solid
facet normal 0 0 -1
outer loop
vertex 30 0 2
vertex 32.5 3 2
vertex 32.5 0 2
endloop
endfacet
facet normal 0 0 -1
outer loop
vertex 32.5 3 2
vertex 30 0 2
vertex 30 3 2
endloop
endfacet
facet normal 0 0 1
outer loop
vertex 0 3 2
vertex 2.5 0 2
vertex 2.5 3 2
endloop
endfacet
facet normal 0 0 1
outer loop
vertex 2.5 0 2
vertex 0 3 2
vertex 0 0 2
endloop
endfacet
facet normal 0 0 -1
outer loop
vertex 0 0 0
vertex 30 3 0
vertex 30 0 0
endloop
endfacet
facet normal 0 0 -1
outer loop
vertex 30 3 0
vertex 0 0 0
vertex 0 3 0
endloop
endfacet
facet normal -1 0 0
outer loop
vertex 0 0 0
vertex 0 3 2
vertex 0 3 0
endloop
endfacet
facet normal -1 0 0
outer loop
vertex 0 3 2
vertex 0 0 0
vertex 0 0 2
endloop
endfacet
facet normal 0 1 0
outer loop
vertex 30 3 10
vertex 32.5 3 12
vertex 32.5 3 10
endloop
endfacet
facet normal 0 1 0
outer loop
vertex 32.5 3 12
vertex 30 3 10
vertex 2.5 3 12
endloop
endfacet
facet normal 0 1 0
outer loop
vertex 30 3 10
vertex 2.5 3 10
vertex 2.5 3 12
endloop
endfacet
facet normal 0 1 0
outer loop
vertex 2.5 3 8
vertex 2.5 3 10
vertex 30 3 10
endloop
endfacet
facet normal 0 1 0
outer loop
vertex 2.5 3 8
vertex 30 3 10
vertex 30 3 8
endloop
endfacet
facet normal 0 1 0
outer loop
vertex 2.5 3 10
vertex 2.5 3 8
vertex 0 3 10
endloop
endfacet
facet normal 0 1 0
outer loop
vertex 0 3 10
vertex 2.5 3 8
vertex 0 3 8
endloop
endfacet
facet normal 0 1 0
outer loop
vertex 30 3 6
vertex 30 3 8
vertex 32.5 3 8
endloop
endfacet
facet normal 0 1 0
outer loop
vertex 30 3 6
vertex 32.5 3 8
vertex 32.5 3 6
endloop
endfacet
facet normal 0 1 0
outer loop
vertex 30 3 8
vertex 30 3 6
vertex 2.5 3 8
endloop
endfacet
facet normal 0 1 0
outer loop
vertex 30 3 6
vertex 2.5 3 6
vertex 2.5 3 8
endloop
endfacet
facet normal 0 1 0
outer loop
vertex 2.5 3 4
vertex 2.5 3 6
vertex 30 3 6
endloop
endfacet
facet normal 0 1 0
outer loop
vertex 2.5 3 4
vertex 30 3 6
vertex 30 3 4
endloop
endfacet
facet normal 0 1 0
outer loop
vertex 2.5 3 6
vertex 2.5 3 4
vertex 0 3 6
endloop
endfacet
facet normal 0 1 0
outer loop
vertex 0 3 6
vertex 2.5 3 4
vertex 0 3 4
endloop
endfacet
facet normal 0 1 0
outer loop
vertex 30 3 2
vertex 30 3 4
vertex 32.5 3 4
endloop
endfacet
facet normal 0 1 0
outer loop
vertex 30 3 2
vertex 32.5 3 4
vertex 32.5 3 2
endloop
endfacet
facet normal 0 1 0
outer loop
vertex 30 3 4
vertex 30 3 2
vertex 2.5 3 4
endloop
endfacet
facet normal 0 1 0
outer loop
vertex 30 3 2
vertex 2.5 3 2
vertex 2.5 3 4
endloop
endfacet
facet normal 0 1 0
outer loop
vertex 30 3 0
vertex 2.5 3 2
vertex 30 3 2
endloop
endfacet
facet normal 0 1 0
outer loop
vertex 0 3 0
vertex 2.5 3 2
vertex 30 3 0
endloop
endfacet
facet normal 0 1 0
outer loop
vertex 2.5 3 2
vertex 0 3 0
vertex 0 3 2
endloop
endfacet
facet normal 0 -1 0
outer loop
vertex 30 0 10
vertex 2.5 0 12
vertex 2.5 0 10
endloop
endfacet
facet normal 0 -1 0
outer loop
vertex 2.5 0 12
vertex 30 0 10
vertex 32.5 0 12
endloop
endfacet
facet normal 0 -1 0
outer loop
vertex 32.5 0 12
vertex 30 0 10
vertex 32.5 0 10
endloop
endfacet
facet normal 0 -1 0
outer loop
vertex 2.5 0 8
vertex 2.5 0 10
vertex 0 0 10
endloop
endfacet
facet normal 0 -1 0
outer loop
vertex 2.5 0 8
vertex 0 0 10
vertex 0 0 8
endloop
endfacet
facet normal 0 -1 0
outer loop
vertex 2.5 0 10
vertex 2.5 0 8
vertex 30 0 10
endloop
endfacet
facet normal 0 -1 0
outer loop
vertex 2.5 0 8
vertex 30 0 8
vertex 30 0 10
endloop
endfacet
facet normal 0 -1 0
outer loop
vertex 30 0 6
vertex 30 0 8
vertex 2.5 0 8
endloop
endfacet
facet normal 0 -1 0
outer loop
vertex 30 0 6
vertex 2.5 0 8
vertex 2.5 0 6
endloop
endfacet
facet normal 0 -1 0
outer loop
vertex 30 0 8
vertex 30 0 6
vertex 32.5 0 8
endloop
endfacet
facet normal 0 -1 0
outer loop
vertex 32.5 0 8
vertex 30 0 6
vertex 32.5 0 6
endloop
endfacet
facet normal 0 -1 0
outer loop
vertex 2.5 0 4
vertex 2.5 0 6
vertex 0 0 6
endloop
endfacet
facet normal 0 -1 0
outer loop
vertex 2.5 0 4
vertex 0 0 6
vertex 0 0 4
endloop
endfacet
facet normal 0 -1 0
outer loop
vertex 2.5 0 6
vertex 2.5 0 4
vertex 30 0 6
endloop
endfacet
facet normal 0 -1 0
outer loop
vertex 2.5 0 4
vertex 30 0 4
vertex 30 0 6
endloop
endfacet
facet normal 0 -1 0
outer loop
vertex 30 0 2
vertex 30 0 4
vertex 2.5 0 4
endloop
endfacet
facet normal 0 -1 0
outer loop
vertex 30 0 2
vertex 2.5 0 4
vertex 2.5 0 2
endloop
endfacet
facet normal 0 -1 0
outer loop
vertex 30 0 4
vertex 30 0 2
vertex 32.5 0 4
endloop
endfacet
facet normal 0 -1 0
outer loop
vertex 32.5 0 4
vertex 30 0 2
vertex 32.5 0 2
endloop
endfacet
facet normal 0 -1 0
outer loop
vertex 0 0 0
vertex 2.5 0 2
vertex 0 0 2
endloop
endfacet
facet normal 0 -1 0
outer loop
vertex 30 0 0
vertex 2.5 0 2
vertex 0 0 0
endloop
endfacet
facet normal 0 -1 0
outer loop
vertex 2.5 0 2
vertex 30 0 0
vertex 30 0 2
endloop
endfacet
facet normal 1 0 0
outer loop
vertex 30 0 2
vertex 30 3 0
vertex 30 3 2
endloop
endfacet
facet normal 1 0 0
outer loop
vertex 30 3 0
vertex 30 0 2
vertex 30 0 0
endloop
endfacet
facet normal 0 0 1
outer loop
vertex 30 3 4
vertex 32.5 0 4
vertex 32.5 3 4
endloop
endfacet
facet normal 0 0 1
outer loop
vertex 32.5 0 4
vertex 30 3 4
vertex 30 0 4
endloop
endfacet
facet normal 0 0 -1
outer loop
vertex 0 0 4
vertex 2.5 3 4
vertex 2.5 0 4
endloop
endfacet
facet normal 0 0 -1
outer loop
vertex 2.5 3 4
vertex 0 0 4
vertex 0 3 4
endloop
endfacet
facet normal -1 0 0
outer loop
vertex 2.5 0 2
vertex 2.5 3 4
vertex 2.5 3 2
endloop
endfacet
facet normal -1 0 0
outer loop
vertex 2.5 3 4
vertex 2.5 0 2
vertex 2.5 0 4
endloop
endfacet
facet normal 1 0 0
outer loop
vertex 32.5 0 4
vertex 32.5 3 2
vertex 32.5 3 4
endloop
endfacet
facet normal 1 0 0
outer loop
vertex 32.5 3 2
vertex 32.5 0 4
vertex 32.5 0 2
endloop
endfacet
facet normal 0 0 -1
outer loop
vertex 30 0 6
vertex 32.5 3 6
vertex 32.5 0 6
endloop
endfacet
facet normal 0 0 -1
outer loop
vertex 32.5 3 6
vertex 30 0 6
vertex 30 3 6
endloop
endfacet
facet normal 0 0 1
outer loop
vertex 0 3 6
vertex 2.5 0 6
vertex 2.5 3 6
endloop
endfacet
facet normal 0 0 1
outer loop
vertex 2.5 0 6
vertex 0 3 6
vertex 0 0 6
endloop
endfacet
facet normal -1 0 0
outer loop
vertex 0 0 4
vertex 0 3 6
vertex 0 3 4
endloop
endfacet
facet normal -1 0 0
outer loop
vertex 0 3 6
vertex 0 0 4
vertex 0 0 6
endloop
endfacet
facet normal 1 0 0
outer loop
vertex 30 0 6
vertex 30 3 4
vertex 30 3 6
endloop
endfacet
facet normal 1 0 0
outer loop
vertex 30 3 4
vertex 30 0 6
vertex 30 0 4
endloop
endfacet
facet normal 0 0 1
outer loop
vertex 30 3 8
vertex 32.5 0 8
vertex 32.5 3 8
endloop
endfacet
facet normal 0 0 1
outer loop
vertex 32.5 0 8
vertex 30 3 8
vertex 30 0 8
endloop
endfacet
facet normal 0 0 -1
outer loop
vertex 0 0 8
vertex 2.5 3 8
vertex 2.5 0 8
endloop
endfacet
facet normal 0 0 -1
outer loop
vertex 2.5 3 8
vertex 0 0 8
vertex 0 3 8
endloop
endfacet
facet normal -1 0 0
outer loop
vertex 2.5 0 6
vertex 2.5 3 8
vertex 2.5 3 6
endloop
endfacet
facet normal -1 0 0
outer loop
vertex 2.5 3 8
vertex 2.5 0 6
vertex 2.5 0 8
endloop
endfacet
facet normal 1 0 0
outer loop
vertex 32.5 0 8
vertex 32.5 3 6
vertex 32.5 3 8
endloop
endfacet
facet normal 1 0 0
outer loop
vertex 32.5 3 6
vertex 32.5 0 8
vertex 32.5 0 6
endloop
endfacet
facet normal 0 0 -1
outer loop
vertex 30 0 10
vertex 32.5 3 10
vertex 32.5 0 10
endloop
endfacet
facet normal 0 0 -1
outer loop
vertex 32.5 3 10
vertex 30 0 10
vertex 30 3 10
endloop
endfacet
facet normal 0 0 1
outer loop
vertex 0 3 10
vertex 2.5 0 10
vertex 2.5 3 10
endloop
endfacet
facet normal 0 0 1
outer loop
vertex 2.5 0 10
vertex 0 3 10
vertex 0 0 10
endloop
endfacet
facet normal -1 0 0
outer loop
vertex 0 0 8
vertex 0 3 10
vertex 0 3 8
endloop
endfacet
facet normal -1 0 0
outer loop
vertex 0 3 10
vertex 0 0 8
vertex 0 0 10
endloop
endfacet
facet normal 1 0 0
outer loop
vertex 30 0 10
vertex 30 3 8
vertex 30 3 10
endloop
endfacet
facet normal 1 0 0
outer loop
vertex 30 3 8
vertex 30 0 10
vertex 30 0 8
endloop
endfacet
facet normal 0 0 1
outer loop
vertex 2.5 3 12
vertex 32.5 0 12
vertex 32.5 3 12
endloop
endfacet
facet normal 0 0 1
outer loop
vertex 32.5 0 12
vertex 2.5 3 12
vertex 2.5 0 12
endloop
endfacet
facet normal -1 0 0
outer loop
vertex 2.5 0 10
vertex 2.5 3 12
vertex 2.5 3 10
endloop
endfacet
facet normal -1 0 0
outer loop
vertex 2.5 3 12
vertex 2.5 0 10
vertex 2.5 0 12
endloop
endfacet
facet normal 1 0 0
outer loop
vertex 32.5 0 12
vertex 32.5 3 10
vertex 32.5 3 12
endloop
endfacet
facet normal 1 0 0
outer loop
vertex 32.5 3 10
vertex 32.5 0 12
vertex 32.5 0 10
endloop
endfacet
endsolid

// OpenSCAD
brick_length=5;
half_brick_length=brick_length/2;
brick_width=3;
brick_height=2;

for(layer=[0:1:5])
for(run=[0:1:5]){
shift= layer % 2; // <-- this is the sauce
translate(
[run*brick_length+shift*half_brick_length,
0,
layer*brick_height])
brick();
}

module brick(){color(rands(0,1,3)) 
cube([brick_length,brick_width,brick_height]);}
